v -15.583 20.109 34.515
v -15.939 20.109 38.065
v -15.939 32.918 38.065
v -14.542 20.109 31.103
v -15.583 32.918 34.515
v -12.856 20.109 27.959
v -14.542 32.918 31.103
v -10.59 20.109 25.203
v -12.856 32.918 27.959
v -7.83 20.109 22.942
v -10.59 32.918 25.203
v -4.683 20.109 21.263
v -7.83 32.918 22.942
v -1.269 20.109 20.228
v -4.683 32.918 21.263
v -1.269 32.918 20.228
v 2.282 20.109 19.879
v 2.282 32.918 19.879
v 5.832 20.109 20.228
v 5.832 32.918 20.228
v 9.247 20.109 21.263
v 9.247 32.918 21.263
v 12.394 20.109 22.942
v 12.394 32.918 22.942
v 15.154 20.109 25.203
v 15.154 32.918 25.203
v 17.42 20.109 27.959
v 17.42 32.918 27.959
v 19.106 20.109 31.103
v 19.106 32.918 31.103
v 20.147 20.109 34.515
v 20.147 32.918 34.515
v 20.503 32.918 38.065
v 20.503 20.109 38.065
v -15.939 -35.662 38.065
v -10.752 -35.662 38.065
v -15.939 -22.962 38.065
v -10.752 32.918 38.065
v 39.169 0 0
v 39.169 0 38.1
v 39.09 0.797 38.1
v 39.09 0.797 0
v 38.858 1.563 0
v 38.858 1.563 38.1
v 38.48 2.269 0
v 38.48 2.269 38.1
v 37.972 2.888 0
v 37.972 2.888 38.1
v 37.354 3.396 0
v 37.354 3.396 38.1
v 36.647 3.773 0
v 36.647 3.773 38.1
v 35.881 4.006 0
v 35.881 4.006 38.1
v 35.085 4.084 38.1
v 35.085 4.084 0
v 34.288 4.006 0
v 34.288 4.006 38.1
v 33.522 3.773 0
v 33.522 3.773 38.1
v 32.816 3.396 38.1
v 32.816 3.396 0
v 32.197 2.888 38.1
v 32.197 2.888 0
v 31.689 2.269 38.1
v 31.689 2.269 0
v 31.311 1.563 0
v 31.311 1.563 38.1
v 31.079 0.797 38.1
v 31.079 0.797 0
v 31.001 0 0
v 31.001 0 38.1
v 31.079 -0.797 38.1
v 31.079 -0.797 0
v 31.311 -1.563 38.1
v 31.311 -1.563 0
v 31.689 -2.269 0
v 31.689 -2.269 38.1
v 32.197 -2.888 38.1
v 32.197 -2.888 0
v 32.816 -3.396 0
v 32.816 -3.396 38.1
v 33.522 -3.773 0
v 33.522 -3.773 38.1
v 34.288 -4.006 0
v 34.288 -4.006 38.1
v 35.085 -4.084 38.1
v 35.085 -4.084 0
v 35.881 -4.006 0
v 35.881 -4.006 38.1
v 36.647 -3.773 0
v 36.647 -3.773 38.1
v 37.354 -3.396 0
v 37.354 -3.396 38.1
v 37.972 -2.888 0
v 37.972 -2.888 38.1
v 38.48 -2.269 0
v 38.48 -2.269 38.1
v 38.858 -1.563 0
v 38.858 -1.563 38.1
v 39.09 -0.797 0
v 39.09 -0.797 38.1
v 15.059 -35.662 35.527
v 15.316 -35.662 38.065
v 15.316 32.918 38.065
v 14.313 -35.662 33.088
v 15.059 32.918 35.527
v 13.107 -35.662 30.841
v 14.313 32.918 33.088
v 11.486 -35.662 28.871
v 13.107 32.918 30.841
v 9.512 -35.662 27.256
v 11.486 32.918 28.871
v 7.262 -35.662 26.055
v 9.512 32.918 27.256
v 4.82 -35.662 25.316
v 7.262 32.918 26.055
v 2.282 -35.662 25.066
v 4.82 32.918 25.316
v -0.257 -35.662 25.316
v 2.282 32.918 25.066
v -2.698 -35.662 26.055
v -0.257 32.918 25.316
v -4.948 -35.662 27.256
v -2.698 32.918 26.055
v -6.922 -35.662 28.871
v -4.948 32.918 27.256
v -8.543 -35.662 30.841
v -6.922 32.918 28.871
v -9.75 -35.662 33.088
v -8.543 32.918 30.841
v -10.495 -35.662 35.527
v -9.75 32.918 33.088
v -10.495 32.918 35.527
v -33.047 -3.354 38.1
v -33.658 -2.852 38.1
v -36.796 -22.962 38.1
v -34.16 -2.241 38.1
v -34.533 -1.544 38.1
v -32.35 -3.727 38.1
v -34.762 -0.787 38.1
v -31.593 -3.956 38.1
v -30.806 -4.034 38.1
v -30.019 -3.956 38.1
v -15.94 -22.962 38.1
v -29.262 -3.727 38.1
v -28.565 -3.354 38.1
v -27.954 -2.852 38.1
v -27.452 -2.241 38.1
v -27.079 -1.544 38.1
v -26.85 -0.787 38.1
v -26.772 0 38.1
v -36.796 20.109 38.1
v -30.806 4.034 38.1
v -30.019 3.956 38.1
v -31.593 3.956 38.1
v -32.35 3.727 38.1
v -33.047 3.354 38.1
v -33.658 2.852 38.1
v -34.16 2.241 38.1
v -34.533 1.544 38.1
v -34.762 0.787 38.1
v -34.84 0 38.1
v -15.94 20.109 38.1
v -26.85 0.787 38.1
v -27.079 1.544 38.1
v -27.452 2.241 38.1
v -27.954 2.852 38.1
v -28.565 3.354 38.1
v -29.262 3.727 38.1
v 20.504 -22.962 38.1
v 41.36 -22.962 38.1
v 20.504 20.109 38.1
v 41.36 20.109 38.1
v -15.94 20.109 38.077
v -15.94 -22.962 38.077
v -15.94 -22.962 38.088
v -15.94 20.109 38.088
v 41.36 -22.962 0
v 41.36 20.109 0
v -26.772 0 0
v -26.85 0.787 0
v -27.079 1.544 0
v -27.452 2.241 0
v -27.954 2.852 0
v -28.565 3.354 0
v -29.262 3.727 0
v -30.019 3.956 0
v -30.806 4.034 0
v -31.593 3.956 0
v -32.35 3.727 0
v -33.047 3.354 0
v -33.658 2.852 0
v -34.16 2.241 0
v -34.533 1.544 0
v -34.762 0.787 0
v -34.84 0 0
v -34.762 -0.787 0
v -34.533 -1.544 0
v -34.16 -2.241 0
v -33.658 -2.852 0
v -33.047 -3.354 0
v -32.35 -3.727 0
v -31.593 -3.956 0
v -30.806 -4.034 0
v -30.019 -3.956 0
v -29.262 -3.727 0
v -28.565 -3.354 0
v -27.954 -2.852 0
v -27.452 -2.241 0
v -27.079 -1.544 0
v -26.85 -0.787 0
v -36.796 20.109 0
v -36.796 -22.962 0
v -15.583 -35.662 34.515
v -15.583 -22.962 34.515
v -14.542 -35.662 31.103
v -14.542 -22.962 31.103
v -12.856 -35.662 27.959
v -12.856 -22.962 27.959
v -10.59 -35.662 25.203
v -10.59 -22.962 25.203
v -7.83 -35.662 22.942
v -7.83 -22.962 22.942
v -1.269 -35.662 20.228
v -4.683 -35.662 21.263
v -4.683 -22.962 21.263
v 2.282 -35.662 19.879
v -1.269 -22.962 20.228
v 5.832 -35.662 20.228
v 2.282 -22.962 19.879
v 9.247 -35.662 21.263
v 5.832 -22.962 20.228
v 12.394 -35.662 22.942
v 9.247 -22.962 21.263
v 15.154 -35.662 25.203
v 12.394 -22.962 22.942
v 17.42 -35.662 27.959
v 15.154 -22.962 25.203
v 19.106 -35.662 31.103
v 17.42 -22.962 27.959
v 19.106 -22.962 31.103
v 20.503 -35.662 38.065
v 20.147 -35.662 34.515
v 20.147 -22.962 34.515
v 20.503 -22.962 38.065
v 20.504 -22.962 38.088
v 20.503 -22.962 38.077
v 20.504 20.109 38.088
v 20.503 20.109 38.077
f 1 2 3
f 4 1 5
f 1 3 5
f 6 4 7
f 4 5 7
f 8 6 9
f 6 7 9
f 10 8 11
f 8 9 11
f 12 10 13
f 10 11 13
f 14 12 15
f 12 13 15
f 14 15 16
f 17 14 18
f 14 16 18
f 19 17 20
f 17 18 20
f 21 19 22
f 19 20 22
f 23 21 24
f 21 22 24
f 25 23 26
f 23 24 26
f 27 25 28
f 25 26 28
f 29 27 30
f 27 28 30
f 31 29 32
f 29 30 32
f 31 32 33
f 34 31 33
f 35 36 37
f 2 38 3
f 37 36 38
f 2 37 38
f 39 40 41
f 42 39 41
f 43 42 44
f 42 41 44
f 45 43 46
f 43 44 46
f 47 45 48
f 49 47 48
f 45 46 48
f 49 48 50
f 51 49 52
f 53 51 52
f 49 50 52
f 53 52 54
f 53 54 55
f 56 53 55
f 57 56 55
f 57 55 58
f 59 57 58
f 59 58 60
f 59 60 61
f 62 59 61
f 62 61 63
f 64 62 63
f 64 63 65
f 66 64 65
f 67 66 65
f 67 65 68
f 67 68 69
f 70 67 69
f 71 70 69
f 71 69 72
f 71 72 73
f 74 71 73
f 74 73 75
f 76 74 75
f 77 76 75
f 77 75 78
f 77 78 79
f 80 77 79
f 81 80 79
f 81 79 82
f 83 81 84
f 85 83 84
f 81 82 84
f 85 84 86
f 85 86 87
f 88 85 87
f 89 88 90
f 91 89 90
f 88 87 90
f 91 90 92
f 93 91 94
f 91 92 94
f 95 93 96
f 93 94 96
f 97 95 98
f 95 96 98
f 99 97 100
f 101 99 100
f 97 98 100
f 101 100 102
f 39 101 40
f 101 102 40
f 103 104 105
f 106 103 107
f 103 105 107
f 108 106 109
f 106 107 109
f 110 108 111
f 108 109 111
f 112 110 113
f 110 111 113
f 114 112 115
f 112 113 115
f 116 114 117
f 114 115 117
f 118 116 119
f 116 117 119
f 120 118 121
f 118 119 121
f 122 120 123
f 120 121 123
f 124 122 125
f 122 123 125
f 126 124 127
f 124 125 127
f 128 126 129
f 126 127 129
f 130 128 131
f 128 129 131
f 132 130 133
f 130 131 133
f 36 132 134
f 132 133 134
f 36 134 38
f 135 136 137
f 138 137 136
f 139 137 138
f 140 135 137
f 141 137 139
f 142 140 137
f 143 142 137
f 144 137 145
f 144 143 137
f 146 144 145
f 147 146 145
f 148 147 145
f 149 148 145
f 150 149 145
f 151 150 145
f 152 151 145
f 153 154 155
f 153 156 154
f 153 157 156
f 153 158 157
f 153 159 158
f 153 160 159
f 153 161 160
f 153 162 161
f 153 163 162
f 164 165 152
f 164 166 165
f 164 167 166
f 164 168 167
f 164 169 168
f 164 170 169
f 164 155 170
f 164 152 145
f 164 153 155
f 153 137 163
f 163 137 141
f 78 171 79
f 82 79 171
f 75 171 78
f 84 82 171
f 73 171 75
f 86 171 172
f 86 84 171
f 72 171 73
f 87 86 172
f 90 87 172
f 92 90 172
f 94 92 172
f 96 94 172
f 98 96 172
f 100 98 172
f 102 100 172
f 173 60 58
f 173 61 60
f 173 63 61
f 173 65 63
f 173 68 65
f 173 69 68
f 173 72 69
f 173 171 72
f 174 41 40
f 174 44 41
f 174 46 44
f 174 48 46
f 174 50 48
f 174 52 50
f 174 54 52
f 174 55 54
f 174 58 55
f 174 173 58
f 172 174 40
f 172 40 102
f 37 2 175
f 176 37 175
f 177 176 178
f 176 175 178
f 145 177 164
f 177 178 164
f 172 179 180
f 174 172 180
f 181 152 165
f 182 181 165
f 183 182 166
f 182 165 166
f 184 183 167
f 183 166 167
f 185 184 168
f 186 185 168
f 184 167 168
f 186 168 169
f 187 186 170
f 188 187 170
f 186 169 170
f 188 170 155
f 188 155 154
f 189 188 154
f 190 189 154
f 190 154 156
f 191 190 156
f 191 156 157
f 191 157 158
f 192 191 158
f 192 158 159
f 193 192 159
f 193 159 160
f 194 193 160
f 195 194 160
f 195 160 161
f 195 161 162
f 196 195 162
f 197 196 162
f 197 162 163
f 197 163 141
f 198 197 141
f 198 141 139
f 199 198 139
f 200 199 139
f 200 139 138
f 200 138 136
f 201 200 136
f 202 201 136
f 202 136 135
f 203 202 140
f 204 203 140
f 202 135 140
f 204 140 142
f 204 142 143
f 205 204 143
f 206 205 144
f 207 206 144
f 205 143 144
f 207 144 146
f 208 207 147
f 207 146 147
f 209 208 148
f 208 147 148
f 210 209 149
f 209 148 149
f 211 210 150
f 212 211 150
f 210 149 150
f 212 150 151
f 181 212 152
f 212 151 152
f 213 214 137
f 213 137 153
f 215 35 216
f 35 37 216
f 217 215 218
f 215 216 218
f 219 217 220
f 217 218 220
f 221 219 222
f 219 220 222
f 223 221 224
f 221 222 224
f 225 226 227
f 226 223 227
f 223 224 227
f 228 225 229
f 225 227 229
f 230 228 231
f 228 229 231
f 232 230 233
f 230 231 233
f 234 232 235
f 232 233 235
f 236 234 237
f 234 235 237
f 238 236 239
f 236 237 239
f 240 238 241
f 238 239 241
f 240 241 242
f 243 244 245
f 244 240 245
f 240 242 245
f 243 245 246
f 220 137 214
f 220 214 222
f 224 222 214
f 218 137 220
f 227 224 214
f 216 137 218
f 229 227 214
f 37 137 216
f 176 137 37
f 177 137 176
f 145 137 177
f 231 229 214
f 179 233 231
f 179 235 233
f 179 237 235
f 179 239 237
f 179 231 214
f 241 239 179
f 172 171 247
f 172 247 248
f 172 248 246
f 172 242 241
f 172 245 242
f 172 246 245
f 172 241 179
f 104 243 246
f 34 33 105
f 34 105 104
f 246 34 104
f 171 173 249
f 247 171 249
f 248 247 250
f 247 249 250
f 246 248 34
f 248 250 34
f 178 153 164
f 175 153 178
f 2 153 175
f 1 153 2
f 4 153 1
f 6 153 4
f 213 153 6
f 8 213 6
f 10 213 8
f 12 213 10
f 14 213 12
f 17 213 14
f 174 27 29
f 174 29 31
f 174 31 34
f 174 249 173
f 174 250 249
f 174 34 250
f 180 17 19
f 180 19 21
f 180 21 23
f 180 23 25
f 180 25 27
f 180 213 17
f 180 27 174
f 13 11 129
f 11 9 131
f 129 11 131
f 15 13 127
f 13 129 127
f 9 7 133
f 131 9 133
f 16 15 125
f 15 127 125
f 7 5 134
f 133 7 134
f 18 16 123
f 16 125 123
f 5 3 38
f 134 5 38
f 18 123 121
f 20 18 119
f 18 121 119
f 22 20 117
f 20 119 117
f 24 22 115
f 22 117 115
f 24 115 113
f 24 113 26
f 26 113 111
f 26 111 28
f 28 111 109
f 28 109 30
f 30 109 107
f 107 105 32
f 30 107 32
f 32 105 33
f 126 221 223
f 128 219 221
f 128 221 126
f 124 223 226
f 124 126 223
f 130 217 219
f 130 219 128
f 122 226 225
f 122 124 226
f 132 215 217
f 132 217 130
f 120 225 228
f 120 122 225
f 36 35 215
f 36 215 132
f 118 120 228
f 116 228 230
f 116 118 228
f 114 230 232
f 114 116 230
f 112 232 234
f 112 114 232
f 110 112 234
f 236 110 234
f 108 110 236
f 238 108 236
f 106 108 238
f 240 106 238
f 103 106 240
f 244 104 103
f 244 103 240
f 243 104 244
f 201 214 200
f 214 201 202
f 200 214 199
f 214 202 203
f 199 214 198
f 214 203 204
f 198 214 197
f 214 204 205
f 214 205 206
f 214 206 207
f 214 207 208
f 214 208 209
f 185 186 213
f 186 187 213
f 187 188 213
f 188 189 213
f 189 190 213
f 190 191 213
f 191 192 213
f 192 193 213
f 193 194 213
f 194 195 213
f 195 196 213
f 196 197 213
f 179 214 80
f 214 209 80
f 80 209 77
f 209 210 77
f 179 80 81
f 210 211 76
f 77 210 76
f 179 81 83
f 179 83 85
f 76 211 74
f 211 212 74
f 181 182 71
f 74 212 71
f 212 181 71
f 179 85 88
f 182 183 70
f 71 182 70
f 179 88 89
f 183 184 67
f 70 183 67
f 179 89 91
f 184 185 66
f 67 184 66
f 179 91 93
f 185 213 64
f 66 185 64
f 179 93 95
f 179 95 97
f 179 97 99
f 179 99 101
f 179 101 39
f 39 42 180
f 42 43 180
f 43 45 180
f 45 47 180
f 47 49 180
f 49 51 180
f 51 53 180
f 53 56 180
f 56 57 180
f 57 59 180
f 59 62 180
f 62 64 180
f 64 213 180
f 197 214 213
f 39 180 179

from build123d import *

# Parameters (mm, degrees)
F0_W          = 78.1559385359
F0_H          = 43.0713370442
F1_DEPTH      = 38.1
F2_R          = 18.2210344627
F3_DEPTH      = 55.88
F3_DEPTH_BACK = 12.7
F5_DEPTH      = 68.581
F7_DEPTH      = 68.581
F8_R          = 4.084024571
F8_R_2        = 4.0339119635
F9_DEPTH      = 38.101


with BuildPart() as f1:
    # F0 (on Top) → F1 (new body)
    with BuildSketch(Plane.XY):
        with Locations((2.2819247097, -1.4262031764)):
            Rectangle(F0_W, F0_H)
    extrude(amount=F1_DEPTH)

    # F2 (on face) → F3 (join, two sides)
    with BuildSketch(Plane.XZ.offset(22.9618716985)) as f3_sk:
        with Locations((2.2819247097, 38.1)):
            Circle(F2_R)
    extrude(amount=-F3_DEPTH)
    extrude(f3_sk.sketch, amount=F3_DEPTH_BACK)

    # F4 (on face) → F5 (cut, through all)
    with BuildSketch(Plane(origin=(0, 32.9181283015, 0), x_dir=(-1, 0, 0), z_dir=(0, 1, 0))):
        with BuildLine():
            ThreePointArc((-10.0195623191, 48.5884337417), (-8.1567843282, 26.4653834359), (10.7518114442, 38.1))
            ThreePointArc((10.7518114442, 38.1), (9.3526918544, 43.9748596185), (5.4557128998, 48.5884337417))
            Line((5.4557128998, 48.5884337417), (-10.0195623191, 48.5884337417))
        make_face()
        with BuildLine():
            Line((-10.0195623191, 48.5884337417), (5.4557128998, 48.5884337417))
            ThreePointArc((5.4557128998, 48.5884337417), (-2.2819247097, 51.1337361539), (-10.0195623191, 48.5884337417))
        make_face()
        with BuildLine():
            ThreePointArc((-10.0195623191, 48.5884337417), (-2.2819247097, 51.1337361539), (5.4557128998, 48.5884337417))
            Line((5.4557128998, 48.5884337417), (12.6177012767, 48.5884337417))
            ThreePointArc((12.6177012767, 48.5884337417), (-2.2819247097, 77.2969690713), (-17.1815506961, 48.5884337417))
            Line((-17.1815506961, 48.5884337417), (-10.0195623191, 48.5884337417))
        make_face()
    extrude(amount=-F5_DEPTH, mode=Mode.SUBTRACT)

    # F6 (on face) → F7 (cut, through all)
    with BuildSketch(Plane(origin=(0, 32.9181283015, 0), x_dir=(-1, 0, 0), z_dir=(0, 1, 0))):
        with BuildLine():
            ThreePointArc((15.9390762318, 38.0650488792), (-2.2819247097, 57.0049656909), (-20.5029256512, 38.0650488792))
            Line((-20.5029256512, 38.0650488792), (15.9390762318, 38.0650488792))
        make_face()
    extrude(amount=-F7_DEPTH, mode=Mode.SUBTRACT)

    # F8 (on face) → F9 (cut, through all)
    with BuildSketch(Plane.XY.offset(38.1)):
        with Locations((35.0845977664, 0)):
            Circle(F8_R)
        with Locations((-30.8059900999, 0)):
            Circle(F8_R_2)
    extrude(amount=-F9_DEPTH, mode=Mode.SUBTRACT)


solid = f1.part
